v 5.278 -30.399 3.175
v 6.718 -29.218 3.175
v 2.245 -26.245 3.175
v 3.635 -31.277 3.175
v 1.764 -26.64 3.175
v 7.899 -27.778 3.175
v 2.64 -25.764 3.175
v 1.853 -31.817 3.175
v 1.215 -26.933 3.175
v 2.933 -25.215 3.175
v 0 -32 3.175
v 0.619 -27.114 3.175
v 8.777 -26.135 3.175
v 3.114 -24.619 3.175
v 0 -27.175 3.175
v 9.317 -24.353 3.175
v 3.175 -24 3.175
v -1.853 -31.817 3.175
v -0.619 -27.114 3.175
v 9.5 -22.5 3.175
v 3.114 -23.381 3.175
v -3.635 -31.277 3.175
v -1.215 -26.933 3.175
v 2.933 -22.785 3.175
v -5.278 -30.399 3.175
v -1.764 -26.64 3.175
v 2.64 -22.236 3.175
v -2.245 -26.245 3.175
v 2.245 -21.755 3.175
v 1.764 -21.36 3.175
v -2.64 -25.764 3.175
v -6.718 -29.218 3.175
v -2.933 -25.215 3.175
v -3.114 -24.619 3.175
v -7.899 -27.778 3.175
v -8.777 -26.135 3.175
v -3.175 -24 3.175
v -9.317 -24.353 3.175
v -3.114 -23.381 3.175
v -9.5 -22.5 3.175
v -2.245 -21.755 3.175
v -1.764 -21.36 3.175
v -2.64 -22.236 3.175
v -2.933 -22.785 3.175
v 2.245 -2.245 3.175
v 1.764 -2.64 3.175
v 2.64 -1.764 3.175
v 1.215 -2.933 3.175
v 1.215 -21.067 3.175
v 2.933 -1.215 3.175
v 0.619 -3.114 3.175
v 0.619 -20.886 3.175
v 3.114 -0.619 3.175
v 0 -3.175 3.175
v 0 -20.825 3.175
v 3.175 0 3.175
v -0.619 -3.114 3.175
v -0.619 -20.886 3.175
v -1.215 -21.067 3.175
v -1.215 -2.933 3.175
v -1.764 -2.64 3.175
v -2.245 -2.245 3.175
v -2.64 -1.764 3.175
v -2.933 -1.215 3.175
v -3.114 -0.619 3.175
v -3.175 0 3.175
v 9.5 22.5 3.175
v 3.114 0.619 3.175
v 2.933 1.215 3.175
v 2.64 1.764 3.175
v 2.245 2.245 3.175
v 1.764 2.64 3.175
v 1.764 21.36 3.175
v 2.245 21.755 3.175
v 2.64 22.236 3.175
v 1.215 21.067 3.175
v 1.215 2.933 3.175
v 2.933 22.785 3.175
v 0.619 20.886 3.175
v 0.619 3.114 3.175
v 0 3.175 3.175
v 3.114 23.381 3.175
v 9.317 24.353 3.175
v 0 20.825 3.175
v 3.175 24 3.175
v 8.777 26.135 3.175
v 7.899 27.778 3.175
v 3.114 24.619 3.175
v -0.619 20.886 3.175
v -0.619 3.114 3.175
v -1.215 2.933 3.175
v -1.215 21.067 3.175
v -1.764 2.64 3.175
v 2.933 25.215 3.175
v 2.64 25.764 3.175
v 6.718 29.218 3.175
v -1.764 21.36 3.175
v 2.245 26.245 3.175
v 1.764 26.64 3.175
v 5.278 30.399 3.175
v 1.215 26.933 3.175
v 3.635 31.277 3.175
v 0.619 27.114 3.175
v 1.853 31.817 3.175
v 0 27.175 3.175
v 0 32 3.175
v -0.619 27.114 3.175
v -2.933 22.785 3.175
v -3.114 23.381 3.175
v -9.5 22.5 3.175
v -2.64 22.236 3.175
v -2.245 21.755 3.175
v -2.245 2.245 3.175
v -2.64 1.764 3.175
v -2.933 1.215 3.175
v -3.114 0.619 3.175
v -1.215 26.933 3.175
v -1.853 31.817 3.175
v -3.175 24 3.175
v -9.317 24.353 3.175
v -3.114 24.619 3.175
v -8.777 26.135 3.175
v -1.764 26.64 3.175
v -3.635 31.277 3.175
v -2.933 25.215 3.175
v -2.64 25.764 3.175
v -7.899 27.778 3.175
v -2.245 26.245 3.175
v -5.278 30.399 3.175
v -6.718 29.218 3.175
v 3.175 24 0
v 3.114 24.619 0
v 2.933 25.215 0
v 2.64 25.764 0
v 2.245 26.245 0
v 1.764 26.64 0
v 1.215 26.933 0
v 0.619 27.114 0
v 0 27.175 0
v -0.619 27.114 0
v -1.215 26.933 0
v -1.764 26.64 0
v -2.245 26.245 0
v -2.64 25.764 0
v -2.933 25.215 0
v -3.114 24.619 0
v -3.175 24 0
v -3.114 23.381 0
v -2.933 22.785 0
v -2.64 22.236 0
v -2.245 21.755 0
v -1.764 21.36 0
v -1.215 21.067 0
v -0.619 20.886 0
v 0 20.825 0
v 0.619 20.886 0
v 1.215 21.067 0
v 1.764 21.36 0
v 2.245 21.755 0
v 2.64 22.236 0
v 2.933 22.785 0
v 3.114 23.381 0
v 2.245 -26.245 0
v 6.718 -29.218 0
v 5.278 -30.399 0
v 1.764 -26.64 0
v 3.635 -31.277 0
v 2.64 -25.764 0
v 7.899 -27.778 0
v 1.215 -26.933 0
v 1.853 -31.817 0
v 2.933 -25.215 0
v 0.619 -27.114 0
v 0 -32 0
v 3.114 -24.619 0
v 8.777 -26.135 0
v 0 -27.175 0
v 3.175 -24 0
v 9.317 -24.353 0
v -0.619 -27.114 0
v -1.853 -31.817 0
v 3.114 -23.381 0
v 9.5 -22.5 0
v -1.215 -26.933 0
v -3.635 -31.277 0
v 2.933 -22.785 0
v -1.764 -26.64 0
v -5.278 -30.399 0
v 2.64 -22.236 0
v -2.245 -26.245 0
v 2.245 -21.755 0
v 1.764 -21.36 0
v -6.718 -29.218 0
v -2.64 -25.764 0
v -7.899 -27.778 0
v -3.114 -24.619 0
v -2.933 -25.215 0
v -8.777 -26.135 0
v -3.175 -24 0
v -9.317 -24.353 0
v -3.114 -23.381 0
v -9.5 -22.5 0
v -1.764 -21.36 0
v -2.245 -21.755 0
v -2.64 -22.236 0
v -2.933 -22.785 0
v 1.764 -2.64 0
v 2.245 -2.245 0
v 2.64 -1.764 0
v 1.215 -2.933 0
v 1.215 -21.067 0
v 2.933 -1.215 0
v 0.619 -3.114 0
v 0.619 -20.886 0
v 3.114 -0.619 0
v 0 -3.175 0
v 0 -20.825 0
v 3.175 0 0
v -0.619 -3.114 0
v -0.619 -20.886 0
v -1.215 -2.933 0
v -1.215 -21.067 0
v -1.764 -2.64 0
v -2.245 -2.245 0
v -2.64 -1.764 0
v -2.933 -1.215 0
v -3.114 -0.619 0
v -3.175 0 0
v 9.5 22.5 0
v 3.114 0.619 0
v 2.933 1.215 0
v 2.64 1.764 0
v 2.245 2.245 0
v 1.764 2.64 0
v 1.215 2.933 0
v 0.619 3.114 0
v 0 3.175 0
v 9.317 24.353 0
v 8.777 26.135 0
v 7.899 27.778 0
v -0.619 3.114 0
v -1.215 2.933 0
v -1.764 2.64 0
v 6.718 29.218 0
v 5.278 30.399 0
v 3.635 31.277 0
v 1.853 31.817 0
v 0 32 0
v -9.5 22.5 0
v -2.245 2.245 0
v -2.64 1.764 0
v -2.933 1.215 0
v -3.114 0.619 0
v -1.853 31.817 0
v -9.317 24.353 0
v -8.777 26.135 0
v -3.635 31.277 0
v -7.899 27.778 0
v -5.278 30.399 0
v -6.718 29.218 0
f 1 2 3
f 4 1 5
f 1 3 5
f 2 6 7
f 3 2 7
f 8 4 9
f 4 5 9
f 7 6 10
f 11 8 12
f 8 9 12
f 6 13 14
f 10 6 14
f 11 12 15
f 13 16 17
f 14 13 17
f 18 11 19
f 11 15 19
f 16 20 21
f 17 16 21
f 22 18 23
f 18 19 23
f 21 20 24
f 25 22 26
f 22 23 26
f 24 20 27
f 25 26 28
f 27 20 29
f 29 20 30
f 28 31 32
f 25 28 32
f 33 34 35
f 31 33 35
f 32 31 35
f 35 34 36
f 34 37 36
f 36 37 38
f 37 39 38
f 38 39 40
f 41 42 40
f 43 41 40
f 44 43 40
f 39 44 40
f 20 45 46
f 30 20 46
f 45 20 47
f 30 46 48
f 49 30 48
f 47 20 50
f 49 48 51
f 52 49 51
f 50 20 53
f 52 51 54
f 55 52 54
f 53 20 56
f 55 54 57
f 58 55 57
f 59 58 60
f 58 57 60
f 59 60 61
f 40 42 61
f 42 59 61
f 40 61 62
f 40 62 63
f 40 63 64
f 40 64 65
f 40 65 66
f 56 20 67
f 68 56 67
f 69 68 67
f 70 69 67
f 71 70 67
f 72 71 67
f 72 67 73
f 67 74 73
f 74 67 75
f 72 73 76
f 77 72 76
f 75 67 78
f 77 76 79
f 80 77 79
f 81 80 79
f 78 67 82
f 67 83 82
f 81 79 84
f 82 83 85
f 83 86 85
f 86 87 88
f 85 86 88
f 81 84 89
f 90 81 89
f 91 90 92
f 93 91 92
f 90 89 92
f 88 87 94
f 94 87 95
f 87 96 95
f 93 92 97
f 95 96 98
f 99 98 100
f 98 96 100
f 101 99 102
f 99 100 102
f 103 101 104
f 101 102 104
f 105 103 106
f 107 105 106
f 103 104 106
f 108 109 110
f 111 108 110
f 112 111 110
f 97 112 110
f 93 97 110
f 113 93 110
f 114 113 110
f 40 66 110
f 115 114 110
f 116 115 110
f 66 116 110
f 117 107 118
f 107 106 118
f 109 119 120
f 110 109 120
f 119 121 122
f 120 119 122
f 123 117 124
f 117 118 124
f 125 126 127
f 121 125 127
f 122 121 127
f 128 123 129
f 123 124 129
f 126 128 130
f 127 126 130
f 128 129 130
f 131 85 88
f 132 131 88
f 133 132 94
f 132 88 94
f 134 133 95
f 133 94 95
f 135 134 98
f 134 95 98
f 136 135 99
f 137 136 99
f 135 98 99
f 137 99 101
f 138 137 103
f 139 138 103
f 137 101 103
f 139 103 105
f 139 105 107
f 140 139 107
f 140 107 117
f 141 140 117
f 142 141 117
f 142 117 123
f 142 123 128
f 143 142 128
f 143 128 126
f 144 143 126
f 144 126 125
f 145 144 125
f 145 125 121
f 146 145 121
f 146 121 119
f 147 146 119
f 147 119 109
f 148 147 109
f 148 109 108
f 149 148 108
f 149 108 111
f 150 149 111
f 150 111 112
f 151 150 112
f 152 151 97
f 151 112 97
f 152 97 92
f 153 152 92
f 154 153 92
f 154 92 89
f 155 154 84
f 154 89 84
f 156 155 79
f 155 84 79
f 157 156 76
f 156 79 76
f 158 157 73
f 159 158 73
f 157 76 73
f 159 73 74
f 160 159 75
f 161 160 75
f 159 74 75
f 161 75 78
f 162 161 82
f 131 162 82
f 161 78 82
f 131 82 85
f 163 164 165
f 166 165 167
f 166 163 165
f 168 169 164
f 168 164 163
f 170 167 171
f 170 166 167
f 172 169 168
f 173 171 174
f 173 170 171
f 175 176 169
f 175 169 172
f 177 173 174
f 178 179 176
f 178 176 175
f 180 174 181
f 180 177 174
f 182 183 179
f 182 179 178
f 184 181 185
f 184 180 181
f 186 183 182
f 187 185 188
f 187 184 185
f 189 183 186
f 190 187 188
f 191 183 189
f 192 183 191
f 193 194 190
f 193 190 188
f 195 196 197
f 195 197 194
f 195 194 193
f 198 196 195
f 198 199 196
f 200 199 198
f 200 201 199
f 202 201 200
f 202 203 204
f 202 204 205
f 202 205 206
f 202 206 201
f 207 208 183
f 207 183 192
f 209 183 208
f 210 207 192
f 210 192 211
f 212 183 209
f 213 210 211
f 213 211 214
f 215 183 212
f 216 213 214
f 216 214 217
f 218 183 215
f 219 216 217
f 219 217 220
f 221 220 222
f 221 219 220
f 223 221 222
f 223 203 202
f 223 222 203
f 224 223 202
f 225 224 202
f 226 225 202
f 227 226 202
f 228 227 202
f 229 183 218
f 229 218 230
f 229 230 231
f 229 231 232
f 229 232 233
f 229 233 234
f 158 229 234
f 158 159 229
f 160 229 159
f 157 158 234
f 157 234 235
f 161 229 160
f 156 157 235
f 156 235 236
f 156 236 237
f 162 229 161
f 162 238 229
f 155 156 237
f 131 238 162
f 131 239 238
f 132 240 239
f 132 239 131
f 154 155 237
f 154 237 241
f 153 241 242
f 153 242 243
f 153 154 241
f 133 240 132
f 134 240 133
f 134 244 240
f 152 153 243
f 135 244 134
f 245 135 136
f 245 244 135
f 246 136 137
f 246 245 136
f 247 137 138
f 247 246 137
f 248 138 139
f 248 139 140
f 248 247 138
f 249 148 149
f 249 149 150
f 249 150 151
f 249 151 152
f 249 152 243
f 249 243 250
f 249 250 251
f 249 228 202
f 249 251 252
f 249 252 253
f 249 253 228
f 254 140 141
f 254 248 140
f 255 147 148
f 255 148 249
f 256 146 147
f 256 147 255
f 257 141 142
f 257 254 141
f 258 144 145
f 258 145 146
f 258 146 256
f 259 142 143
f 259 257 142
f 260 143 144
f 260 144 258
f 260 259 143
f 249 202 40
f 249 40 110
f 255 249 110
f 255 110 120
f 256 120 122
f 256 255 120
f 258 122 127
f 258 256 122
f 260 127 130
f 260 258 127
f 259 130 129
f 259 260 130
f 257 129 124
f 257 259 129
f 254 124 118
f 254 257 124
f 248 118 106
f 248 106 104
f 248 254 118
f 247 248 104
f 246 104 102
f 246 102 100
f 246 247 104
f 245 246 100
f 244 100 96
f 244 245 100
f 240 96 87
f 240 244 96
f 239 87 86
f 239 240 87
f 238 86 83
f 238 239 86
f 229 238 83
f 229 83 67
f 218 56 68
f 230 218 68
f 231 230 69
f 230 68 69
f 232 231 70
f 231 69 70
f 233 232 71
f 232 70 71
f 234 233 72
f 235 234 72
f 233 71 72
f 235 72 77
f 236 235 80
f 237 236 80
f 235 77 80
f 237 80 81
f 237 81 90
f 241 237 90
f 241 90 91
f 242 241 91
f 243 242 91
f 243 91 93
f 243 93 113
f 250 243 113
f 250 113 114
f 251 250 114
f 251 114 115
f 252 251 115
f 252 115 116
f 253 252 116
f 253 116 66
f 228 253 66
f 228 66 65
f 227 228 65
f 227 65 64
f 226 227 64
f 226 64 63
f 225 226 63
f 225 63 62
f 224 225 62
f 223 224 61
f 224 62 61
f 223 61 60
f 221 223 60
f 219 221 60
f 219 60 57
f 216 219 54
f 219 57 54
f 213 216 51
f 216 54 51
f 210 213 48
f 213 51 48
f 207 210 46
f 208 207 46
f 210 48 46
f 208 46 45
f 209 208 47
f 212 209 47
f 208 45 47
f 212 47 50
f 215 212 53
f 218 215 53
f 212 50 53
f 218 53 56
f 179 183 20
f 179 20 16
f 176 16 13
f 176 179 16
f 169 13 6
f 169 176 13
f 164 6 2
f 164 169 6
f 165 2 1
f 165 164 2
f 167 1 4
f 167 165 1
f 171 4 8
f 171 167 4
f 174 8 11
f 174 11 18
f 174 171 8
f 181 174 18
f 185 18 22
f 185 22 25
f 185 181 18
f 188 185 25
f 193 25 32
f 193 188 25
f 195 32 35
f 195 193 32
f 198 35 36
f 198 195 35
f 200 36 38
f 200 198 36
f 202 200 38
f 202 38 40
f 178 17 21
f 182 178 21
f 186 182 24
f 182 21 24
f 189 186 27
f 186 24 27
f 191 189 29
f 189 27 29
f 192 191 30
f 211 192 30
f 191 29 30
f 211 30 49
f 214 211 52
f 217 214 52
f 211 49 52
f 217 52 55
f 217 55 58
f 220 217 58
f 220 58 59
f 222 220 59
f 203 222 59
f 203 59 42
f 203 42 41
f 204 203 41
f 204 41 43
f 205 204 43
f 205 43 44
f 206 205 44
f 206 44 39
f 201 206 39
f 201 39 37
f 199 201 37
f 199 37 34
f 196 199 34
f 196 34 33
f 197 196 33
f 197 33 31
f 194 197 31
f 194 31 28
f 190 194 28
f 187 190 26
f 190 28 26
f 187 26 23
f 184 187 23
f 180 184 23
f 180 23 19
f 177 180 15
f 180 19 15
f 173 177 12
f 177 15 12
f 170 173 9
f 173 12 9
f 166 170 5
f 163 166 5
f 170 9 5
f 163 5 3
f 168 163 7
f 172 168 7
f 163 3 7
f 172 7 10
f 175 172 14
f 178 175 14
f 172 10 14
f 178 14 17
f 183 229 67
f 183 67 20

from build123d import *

# Parameters (mm, degrees)
BOSS_EXTRUDE1_DEPTH = 3.175
SKETCH2_R           = 3.175
CUT_EXTRUDE1_DEPTH  = 34.531039724
LPATTERN1_COUNT     = 2
LPATTERN1_PITCH     = 24
LPATTERN1_COL_COUNT = 2
LPATTERN1_COL_PITCH = 24


with BuildPart() as part:
    # Sketch1 → Boss-Extrude1 (new body)
    with BuildSketch(Plane.XY):
        with BuildLine():
            Line((-9.5, -22.5), (-9.5, 22.5))
            ThreePointArc((-9.5, 22.5), (0, 32), (9.5, 22.5))
            Line((9.5, 22.5), (9.5, -22.5))
            ThreePointArc((9.5, -22.5), (0, -32), (-9.5, -22.5))
        make_face()
    extrude(amount=BOSS_EXTRUDE1_DEPTH)

    # Sketch2 → Cut-Extrude1 (cut, through all)
    with BuildSketch(Plane.XY.offset(3.175)):
        Circle(SKETCH2_R)
    cut_extrude1 = extrude(amount=-CUT_EXTRUDE1_DEPTH, mode=Mode.SUBTRACT)

    # LPattern1: Cut-Extrude1 ×2
    with Locations(*[(0, i * LPATTERN1_PITCH, 0) for i in range(1, LPATTERN1_COUNT)]):
        add(cut_extrude1, mode=Mode.SUBTRACT)

    # LPattern1 col: Cut-Extrude1 ×2
    with Locations(*[(0, -i * LPATTERN1_COL_PITCH, 0) for i in range(1, LPATTERN1_COL_COUNT)]):
        add(cut_extrude1, mode=Mode.SUBTRACT)


solid = part.part
